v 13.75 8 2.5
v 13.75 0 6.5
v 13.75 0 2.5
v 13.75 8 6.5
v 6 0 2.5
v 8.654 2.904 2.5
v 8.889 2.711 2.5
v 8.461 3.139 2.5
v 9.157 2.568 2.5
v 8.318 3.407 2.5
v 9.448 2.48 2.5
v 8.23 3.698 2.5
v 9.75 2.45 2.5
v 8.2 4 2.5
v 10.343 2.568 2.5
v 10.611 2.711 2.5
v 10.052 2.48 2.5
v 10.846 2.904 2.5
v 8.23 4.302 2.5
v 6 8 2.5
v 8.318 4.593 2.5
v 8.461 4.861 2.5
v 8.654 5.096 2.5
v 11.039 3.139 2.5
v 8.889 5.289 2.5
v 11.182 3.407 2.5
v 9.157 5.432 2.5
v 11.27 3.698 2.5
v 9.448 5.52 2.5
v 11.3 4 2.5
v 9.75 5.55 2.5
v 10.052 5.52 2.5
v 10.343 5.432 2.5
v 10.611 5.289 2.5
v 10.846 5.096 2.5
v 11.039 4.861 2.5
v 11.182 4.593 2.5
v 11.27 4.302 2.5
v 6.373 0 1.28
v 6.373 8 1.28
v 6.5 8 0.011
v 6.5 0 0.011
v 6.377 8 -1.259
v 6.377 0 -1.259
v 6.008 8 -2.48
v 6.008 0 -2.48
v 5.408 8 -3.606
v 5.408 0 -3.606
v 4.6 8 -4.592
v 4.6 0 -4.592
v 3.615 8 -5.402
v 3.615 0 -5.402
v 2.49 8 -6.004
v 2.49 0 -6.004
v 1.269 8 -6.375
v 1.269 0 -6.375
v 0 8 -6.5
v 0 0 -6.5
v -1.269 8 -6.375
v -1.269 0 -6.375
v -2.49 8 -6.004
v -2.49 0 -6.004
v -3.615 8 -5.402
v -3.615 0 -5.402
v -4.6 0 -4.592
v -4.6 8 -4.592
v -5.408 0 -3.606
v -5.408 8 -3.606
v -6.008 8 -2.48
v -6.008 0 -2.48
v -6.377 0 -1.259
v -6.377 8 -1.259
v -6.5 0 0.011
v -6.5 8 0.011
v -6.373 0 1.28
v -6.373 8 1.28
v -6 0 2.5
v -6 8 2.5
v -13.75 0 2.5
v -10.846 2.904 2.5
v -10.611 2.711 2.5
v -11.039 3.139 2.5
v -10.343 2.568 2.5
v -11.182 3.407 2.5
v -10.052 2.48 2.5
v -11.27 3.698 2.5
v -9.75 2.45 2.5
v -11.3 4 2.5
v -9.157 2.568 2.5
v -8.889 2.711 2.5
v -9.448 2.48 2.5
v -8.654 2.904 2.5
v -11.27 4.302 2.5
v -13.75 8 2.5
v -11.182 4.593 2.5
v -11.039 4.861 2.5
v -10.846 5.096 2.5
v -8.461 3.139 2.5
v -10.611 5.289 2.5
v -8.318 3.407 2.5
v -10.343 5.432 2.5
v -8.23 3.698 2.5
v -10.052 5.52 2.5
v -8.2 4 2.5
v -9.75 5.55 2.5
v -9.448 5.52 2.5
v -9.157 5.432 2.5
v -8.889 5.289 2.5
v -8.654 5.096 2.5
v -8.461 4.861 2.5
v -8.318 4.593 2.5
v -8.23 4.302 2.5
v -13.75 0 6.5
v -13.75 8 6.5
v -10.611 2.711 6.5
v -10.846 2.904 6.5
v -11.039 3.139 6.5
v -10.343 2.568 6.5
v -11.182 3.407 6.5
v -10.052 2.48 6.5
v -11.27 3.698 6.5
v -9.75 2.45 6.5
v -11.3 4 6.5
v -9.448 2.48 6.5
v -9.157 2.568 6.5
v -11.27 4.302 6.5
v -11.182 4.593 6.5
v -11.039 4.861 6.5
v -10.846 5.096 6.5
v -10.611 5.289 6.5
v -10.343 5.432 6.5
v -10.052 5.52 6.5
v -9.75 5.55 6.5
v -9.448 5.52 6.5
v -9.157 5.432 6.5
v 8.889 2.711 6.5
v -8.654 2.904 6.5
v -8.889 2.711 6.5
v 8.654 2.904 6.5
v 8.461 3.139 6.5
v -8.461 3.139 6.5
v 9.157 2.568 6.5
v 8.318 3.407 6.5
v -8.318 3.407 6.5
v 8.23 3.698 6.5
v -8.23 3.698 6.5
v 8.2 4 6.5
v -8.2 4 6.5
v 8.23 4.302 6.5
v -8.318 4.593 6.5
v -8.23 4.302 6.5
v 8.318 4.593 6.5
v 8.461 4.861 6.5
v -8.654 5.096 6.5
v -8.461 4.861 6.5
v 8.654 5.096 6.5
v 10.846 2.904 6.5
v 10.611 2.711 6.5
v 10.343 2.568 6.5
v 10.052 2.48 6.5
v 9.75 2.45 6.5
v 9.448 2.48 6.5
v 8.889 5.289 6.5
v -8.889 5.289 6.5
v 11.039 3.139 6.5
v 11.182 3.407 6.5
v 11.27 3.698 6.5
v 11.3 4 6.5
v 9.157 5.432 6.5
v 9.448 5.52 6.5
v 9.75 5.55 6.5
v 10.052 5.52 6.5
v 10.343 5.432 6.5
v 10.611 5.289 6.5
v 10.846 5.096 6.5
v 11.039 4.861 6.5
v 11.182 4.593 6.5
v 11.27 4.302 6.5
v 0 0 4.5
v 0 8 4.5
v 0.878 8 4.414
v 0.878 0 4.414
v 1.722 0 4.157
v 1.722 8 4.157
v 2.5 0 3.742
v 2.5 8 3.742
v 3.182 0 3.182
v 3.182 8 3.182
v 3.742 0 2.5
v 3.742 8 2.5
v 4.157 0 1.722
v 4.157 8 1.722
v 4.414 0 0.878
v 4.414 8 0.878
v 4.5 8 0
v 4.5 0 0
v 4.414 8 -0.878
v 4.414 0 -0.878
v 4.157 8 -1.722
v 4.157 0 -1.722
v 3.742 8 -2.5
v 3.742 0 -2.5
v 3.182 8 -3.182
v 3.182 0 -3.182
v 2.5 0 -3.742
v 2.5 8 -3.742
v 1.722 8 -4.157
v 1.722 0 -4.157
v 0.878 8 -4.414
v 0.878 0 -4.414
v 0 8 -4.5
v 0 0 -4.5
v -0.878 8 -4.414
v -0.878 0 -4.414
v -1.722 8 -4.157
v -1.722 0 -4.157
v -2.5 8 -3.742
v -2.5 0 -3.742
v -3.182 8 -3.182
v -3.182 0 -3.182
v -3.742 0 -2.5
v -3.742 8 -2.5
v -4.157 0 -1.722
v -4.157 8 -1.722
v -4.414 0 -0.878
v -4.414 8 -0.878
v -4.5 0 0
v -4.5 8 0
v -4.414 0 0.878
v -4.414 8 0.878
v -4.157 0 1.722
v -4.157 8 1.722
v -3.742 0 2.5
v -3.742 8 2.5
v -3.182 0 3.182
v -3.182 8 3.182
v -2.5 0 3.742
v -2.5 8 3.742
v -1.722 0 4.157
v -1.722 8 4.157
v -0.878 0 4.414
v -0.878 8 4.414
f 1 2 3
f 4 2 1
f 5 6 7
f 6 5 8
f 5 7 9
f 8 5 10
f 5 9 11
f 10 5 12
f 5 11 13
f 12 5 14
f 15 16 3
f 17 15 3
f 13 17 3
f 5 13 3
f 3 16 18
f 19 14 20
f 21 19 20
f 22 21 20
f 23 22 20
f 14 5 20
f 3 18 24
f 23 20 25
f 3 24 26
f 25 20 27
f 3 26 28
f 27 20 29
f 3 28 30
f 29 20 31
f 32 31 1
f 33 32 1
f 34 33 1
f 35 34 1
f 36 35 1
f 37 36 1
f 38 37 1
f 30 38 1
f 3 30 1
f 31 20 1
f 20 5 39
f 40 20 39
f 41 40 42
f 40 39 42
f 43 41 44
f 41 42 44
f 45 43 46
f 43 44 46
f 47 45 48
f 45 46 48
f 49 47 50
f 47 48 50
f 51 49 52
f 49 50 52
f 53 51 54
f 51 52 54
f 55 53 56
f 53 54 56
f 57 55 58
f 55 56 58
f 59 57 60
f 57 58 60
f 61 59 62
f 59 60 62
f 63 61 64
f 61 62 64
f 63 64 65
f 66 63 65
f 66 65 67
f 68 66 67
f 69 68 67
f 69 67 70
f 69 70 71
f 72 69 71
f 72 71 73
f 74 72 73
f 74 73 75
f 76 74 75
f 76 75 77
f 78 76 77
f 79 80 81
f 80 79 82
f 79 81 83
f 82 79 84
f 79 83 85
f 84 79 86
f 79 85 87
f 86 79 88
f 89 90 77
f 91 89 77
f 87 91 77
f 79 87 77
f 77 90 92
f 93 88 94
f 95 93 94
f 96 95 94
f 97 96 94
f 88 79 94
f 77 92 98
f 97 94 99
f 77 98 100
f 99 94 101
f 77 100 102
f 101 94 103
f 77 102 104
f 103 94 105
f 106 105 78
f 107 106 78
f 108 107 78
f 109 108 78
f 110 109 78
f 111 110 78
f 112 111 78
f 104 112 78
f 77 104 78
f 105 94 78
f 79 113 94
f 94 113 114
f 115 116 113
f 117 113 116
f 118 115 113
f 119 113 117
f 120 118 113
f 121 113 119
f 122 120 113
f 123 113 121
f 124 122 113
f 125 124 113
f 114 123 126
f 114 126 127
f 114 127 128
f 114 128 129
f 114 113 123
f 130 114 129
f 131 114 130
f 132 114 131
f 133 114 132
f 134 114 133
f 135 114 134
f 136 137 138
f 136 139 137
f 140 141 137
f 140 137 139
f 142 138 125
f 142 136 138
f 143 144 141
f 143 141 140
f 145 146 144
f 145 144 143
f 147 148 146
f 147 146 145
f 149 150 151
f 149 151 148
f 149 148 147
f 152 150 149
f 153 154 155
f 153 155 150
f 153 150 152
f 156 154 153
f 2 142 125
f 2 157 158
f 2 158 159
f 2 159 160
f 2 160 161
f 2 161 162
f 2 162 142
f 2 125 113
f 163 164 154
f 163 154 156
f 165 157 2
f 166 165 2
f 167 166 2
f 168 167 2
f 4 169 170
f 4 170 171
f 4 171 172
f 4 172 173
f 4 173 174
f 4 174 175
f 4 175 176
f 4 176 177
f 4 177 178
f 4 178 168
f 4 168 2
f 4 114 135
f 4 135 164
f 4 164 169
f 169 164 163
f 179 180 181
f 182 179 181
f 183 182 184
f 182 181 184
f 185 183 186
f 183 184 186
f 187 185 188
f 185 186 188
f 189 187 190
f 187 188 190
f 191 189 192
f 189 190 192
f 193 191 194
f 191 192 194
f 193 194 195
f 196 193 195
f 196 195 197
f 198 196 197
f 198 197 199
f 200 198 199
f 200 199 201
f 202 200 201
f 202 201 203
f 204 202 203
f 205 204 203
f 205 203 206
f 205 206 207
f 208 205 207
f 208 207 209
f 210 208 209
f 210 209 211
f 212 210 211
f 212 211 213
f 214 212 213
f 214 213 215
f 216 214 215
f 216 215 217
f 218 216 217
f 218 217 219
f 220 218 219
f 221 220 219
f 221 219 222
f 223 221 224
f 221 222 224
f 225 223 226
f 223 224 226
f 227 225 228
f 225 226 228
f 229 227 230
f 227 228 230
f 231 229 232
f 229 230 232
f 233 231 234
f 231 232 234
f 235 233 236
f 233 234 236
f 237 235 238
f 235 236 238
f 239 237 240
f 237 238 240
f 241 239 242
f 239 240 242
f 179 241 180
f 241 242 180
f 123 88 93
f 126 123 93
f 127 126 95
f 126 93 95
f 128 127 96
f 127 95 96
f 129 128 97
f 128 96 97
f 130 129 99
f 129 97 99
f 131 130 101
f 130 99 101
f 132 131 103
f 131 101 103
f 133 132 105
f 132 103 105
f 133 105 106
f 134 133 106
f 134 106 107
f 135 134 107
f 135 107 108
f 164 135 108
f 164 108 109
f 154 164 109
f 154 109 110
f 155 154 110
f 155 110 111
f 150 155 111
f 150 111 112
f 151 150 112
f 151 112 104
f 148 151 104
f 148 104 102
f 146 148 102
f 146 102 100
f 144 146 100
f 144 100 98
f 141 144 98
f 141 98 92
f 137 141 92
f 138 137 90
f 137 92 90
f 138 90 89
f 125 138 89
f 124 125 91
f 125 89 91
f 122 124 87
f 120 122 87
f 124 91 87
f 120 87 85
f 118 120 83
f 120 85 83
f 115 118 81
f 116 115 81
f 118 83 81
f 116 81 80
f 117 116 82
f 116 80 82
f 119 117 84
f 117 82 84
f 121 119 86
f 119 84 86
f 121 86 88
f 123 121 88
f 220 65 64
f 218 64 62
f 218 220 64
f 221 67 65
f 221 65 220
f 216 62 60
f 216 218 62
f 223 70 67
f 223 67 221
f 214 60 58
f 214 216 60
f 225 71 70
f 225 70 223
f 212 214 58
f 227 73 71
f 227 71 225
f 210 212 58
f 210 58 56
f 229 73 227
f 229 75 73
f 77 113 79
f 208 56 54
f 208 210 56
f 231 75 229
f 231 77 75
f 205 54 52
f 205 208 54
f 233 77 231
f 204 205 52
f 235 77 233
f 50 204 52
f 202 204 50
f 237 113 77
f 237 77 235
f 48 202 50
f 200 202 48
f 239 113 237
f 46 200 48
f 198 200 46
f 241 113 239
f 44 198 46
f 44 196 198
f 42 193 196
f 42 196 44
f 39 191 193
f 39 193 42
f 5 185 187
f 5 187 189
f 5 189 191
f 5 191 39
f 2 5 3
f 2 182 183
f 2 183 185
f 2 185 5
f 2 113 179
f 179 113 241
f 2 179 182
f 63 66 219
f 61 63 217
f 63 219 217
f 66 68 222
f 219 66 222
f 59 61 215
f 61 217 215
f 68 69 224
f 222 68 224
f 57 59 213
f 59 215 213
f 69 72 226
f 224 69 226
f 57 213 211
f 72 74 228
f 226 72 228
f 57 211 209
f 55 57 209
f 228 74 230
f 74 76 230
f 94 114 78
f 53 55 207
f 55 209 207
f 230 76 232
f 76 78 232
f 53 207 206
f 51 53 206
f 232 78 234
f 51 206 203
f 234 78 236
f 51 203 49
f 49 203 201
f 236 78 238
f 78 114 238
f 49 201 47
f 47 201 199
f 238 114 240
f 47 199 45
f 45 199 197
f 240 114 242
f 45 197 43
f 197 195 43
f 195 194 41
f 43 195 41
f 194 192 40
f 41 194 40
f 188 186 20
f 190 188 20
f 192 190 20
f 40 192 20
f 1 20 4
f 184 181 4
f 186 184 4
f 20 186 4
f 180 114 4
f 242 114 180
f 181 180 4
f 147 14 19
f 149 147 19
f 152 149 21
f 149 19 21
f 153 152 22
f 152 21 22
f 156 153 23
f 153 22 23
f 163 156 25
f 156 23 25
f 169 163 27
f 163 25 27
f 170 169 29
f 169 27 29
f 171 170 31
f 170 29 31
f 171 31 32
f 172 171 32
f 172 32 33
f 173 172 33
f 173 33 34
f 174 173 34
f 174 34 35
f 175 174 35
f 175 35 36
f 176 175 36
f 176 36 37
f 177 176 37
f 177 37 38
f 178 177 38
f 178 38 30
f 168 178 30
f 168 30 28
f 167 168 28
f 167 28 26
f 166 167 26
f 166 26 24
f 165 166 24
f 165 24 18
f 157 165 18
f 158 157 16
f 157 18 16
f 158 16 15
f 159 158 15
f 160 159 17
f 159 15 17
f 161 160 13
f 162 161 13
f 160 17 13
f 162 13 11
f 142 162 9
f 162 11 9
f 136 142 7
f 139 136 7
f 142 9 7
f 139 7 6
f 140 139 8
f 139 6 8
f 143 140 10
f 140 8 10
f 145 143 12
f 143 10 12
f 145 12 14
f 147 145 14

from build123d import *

# Parameters (mm, degrees)
SKETCH1_R           = 6.5
BOSS_EXTRUDE1_DEPTH = 8
SKETCH3_W           = 27.5
SKETCH3_H           = 8
BOSS_EXTRUDE2_DEPTH = 4
CUT_EXTRUDE1_REACH  = 19.185
SKETCH4_R           = 4.5
CUT_EXTRUDE2_REACH  = 20.277
SKETCH5_R           = 1.55


with BuildPart() as part:
    # Sketch1 → Boss-Extrude1 (new body)
    with BuildSketch(Plane(origin=(0, 0, 0), x_dir=(1, 0, 0), z_dir=(0, 1, 0))):
        with Locations(Location((0, 0, 0), (0, 0, 270))):
            Circle(SKETCH1_R)
    extrude(amount=BOSS_EXTRUDE1_DEPTH)

    # Sketch3 → Boss-Extrude2 (add)
    with BuildSketch(Plane(origin=(0, 8, 6.5), x_dir=(1, 0, 0), z_dir=(0, 0, 1))):
        with Locations((0, -4)):
            Rectangle(SKETCH3_W, SKETCH3_H)
    extrude(amount=-BOSS_EXTRUDE2_DEPTH)

    # Sketch4 → Cut-Extrude1 (cut, up to next)
    with BuildSketch(Plane(origin=(0, 8, 0), x_dir=(1, 0, 0), z_dir=(0, 1, 0)), mode=Mode.PRIVATE) as cut_extrude1_sk1:
        with Locations(Location((0, 0, 0), (0, 0, 270))):
            Circle(SKETCH4_R)
    cut_extrude1_tool1 = extrude(cut_extrude1_sk1.sketch, amount=-CUT_EXTRUDE1_REACH, mode=Mode.PRIVATE) & part.part
    add(cut_extrude1_tool1.solids().sort_by_distance((0, 8, 0))[0], mode=Mode.SUBTRACT)

    # Sketch5 → Cut-Extrude2 (cut, up to next)
    with BuildSketch(Plane(origin=(0, 0, 2.5), x_dir=(-1, 0, 0), z_dir=(0, 0, -1)), mode=Mode.PRIVATE) as cut_extrude2_sk1:
        with Locations((9.75, 4)):
            Circle(SKETCH5_R)
    cut_extrude2_tool1 = extrude(cut_extrude2_sk1.sketch, amount=-CUT_EXTRUDE2_REACH, mode=Mode.PRIVATE) & part.part
    # Sketch5 → Cut-Extrude2 (cut, up to next)
    with BuildSketch(Plane(origin=(0, 0, 2.5), x_dir=(-1, 0, 0), z_dir=(0, 0, -1)), mode=Mode.PRIVATE) as cut_extrude2_sk2:
        with Locations((-9.75, 4)):
            Circle(SKETCH5_R)
    cut_extrude2_tool2 = extrude(cut_extrude2_sk2.sketch, amount=-CUT_EXTRUDE2_REACH, mode=Mode.PRIVATE) & part.part
    add(cut_extrude2_tool1.solids().sort_by_distance((-9.75, 4, 2.5))[0], mode=Mode.SUBTRACT)
    add(cut_extrude2_tool2.solids().sort_by_distance((9.75, 4, 2.5))[0], mode=Mode.SUBTRACT)


solid = part.part
